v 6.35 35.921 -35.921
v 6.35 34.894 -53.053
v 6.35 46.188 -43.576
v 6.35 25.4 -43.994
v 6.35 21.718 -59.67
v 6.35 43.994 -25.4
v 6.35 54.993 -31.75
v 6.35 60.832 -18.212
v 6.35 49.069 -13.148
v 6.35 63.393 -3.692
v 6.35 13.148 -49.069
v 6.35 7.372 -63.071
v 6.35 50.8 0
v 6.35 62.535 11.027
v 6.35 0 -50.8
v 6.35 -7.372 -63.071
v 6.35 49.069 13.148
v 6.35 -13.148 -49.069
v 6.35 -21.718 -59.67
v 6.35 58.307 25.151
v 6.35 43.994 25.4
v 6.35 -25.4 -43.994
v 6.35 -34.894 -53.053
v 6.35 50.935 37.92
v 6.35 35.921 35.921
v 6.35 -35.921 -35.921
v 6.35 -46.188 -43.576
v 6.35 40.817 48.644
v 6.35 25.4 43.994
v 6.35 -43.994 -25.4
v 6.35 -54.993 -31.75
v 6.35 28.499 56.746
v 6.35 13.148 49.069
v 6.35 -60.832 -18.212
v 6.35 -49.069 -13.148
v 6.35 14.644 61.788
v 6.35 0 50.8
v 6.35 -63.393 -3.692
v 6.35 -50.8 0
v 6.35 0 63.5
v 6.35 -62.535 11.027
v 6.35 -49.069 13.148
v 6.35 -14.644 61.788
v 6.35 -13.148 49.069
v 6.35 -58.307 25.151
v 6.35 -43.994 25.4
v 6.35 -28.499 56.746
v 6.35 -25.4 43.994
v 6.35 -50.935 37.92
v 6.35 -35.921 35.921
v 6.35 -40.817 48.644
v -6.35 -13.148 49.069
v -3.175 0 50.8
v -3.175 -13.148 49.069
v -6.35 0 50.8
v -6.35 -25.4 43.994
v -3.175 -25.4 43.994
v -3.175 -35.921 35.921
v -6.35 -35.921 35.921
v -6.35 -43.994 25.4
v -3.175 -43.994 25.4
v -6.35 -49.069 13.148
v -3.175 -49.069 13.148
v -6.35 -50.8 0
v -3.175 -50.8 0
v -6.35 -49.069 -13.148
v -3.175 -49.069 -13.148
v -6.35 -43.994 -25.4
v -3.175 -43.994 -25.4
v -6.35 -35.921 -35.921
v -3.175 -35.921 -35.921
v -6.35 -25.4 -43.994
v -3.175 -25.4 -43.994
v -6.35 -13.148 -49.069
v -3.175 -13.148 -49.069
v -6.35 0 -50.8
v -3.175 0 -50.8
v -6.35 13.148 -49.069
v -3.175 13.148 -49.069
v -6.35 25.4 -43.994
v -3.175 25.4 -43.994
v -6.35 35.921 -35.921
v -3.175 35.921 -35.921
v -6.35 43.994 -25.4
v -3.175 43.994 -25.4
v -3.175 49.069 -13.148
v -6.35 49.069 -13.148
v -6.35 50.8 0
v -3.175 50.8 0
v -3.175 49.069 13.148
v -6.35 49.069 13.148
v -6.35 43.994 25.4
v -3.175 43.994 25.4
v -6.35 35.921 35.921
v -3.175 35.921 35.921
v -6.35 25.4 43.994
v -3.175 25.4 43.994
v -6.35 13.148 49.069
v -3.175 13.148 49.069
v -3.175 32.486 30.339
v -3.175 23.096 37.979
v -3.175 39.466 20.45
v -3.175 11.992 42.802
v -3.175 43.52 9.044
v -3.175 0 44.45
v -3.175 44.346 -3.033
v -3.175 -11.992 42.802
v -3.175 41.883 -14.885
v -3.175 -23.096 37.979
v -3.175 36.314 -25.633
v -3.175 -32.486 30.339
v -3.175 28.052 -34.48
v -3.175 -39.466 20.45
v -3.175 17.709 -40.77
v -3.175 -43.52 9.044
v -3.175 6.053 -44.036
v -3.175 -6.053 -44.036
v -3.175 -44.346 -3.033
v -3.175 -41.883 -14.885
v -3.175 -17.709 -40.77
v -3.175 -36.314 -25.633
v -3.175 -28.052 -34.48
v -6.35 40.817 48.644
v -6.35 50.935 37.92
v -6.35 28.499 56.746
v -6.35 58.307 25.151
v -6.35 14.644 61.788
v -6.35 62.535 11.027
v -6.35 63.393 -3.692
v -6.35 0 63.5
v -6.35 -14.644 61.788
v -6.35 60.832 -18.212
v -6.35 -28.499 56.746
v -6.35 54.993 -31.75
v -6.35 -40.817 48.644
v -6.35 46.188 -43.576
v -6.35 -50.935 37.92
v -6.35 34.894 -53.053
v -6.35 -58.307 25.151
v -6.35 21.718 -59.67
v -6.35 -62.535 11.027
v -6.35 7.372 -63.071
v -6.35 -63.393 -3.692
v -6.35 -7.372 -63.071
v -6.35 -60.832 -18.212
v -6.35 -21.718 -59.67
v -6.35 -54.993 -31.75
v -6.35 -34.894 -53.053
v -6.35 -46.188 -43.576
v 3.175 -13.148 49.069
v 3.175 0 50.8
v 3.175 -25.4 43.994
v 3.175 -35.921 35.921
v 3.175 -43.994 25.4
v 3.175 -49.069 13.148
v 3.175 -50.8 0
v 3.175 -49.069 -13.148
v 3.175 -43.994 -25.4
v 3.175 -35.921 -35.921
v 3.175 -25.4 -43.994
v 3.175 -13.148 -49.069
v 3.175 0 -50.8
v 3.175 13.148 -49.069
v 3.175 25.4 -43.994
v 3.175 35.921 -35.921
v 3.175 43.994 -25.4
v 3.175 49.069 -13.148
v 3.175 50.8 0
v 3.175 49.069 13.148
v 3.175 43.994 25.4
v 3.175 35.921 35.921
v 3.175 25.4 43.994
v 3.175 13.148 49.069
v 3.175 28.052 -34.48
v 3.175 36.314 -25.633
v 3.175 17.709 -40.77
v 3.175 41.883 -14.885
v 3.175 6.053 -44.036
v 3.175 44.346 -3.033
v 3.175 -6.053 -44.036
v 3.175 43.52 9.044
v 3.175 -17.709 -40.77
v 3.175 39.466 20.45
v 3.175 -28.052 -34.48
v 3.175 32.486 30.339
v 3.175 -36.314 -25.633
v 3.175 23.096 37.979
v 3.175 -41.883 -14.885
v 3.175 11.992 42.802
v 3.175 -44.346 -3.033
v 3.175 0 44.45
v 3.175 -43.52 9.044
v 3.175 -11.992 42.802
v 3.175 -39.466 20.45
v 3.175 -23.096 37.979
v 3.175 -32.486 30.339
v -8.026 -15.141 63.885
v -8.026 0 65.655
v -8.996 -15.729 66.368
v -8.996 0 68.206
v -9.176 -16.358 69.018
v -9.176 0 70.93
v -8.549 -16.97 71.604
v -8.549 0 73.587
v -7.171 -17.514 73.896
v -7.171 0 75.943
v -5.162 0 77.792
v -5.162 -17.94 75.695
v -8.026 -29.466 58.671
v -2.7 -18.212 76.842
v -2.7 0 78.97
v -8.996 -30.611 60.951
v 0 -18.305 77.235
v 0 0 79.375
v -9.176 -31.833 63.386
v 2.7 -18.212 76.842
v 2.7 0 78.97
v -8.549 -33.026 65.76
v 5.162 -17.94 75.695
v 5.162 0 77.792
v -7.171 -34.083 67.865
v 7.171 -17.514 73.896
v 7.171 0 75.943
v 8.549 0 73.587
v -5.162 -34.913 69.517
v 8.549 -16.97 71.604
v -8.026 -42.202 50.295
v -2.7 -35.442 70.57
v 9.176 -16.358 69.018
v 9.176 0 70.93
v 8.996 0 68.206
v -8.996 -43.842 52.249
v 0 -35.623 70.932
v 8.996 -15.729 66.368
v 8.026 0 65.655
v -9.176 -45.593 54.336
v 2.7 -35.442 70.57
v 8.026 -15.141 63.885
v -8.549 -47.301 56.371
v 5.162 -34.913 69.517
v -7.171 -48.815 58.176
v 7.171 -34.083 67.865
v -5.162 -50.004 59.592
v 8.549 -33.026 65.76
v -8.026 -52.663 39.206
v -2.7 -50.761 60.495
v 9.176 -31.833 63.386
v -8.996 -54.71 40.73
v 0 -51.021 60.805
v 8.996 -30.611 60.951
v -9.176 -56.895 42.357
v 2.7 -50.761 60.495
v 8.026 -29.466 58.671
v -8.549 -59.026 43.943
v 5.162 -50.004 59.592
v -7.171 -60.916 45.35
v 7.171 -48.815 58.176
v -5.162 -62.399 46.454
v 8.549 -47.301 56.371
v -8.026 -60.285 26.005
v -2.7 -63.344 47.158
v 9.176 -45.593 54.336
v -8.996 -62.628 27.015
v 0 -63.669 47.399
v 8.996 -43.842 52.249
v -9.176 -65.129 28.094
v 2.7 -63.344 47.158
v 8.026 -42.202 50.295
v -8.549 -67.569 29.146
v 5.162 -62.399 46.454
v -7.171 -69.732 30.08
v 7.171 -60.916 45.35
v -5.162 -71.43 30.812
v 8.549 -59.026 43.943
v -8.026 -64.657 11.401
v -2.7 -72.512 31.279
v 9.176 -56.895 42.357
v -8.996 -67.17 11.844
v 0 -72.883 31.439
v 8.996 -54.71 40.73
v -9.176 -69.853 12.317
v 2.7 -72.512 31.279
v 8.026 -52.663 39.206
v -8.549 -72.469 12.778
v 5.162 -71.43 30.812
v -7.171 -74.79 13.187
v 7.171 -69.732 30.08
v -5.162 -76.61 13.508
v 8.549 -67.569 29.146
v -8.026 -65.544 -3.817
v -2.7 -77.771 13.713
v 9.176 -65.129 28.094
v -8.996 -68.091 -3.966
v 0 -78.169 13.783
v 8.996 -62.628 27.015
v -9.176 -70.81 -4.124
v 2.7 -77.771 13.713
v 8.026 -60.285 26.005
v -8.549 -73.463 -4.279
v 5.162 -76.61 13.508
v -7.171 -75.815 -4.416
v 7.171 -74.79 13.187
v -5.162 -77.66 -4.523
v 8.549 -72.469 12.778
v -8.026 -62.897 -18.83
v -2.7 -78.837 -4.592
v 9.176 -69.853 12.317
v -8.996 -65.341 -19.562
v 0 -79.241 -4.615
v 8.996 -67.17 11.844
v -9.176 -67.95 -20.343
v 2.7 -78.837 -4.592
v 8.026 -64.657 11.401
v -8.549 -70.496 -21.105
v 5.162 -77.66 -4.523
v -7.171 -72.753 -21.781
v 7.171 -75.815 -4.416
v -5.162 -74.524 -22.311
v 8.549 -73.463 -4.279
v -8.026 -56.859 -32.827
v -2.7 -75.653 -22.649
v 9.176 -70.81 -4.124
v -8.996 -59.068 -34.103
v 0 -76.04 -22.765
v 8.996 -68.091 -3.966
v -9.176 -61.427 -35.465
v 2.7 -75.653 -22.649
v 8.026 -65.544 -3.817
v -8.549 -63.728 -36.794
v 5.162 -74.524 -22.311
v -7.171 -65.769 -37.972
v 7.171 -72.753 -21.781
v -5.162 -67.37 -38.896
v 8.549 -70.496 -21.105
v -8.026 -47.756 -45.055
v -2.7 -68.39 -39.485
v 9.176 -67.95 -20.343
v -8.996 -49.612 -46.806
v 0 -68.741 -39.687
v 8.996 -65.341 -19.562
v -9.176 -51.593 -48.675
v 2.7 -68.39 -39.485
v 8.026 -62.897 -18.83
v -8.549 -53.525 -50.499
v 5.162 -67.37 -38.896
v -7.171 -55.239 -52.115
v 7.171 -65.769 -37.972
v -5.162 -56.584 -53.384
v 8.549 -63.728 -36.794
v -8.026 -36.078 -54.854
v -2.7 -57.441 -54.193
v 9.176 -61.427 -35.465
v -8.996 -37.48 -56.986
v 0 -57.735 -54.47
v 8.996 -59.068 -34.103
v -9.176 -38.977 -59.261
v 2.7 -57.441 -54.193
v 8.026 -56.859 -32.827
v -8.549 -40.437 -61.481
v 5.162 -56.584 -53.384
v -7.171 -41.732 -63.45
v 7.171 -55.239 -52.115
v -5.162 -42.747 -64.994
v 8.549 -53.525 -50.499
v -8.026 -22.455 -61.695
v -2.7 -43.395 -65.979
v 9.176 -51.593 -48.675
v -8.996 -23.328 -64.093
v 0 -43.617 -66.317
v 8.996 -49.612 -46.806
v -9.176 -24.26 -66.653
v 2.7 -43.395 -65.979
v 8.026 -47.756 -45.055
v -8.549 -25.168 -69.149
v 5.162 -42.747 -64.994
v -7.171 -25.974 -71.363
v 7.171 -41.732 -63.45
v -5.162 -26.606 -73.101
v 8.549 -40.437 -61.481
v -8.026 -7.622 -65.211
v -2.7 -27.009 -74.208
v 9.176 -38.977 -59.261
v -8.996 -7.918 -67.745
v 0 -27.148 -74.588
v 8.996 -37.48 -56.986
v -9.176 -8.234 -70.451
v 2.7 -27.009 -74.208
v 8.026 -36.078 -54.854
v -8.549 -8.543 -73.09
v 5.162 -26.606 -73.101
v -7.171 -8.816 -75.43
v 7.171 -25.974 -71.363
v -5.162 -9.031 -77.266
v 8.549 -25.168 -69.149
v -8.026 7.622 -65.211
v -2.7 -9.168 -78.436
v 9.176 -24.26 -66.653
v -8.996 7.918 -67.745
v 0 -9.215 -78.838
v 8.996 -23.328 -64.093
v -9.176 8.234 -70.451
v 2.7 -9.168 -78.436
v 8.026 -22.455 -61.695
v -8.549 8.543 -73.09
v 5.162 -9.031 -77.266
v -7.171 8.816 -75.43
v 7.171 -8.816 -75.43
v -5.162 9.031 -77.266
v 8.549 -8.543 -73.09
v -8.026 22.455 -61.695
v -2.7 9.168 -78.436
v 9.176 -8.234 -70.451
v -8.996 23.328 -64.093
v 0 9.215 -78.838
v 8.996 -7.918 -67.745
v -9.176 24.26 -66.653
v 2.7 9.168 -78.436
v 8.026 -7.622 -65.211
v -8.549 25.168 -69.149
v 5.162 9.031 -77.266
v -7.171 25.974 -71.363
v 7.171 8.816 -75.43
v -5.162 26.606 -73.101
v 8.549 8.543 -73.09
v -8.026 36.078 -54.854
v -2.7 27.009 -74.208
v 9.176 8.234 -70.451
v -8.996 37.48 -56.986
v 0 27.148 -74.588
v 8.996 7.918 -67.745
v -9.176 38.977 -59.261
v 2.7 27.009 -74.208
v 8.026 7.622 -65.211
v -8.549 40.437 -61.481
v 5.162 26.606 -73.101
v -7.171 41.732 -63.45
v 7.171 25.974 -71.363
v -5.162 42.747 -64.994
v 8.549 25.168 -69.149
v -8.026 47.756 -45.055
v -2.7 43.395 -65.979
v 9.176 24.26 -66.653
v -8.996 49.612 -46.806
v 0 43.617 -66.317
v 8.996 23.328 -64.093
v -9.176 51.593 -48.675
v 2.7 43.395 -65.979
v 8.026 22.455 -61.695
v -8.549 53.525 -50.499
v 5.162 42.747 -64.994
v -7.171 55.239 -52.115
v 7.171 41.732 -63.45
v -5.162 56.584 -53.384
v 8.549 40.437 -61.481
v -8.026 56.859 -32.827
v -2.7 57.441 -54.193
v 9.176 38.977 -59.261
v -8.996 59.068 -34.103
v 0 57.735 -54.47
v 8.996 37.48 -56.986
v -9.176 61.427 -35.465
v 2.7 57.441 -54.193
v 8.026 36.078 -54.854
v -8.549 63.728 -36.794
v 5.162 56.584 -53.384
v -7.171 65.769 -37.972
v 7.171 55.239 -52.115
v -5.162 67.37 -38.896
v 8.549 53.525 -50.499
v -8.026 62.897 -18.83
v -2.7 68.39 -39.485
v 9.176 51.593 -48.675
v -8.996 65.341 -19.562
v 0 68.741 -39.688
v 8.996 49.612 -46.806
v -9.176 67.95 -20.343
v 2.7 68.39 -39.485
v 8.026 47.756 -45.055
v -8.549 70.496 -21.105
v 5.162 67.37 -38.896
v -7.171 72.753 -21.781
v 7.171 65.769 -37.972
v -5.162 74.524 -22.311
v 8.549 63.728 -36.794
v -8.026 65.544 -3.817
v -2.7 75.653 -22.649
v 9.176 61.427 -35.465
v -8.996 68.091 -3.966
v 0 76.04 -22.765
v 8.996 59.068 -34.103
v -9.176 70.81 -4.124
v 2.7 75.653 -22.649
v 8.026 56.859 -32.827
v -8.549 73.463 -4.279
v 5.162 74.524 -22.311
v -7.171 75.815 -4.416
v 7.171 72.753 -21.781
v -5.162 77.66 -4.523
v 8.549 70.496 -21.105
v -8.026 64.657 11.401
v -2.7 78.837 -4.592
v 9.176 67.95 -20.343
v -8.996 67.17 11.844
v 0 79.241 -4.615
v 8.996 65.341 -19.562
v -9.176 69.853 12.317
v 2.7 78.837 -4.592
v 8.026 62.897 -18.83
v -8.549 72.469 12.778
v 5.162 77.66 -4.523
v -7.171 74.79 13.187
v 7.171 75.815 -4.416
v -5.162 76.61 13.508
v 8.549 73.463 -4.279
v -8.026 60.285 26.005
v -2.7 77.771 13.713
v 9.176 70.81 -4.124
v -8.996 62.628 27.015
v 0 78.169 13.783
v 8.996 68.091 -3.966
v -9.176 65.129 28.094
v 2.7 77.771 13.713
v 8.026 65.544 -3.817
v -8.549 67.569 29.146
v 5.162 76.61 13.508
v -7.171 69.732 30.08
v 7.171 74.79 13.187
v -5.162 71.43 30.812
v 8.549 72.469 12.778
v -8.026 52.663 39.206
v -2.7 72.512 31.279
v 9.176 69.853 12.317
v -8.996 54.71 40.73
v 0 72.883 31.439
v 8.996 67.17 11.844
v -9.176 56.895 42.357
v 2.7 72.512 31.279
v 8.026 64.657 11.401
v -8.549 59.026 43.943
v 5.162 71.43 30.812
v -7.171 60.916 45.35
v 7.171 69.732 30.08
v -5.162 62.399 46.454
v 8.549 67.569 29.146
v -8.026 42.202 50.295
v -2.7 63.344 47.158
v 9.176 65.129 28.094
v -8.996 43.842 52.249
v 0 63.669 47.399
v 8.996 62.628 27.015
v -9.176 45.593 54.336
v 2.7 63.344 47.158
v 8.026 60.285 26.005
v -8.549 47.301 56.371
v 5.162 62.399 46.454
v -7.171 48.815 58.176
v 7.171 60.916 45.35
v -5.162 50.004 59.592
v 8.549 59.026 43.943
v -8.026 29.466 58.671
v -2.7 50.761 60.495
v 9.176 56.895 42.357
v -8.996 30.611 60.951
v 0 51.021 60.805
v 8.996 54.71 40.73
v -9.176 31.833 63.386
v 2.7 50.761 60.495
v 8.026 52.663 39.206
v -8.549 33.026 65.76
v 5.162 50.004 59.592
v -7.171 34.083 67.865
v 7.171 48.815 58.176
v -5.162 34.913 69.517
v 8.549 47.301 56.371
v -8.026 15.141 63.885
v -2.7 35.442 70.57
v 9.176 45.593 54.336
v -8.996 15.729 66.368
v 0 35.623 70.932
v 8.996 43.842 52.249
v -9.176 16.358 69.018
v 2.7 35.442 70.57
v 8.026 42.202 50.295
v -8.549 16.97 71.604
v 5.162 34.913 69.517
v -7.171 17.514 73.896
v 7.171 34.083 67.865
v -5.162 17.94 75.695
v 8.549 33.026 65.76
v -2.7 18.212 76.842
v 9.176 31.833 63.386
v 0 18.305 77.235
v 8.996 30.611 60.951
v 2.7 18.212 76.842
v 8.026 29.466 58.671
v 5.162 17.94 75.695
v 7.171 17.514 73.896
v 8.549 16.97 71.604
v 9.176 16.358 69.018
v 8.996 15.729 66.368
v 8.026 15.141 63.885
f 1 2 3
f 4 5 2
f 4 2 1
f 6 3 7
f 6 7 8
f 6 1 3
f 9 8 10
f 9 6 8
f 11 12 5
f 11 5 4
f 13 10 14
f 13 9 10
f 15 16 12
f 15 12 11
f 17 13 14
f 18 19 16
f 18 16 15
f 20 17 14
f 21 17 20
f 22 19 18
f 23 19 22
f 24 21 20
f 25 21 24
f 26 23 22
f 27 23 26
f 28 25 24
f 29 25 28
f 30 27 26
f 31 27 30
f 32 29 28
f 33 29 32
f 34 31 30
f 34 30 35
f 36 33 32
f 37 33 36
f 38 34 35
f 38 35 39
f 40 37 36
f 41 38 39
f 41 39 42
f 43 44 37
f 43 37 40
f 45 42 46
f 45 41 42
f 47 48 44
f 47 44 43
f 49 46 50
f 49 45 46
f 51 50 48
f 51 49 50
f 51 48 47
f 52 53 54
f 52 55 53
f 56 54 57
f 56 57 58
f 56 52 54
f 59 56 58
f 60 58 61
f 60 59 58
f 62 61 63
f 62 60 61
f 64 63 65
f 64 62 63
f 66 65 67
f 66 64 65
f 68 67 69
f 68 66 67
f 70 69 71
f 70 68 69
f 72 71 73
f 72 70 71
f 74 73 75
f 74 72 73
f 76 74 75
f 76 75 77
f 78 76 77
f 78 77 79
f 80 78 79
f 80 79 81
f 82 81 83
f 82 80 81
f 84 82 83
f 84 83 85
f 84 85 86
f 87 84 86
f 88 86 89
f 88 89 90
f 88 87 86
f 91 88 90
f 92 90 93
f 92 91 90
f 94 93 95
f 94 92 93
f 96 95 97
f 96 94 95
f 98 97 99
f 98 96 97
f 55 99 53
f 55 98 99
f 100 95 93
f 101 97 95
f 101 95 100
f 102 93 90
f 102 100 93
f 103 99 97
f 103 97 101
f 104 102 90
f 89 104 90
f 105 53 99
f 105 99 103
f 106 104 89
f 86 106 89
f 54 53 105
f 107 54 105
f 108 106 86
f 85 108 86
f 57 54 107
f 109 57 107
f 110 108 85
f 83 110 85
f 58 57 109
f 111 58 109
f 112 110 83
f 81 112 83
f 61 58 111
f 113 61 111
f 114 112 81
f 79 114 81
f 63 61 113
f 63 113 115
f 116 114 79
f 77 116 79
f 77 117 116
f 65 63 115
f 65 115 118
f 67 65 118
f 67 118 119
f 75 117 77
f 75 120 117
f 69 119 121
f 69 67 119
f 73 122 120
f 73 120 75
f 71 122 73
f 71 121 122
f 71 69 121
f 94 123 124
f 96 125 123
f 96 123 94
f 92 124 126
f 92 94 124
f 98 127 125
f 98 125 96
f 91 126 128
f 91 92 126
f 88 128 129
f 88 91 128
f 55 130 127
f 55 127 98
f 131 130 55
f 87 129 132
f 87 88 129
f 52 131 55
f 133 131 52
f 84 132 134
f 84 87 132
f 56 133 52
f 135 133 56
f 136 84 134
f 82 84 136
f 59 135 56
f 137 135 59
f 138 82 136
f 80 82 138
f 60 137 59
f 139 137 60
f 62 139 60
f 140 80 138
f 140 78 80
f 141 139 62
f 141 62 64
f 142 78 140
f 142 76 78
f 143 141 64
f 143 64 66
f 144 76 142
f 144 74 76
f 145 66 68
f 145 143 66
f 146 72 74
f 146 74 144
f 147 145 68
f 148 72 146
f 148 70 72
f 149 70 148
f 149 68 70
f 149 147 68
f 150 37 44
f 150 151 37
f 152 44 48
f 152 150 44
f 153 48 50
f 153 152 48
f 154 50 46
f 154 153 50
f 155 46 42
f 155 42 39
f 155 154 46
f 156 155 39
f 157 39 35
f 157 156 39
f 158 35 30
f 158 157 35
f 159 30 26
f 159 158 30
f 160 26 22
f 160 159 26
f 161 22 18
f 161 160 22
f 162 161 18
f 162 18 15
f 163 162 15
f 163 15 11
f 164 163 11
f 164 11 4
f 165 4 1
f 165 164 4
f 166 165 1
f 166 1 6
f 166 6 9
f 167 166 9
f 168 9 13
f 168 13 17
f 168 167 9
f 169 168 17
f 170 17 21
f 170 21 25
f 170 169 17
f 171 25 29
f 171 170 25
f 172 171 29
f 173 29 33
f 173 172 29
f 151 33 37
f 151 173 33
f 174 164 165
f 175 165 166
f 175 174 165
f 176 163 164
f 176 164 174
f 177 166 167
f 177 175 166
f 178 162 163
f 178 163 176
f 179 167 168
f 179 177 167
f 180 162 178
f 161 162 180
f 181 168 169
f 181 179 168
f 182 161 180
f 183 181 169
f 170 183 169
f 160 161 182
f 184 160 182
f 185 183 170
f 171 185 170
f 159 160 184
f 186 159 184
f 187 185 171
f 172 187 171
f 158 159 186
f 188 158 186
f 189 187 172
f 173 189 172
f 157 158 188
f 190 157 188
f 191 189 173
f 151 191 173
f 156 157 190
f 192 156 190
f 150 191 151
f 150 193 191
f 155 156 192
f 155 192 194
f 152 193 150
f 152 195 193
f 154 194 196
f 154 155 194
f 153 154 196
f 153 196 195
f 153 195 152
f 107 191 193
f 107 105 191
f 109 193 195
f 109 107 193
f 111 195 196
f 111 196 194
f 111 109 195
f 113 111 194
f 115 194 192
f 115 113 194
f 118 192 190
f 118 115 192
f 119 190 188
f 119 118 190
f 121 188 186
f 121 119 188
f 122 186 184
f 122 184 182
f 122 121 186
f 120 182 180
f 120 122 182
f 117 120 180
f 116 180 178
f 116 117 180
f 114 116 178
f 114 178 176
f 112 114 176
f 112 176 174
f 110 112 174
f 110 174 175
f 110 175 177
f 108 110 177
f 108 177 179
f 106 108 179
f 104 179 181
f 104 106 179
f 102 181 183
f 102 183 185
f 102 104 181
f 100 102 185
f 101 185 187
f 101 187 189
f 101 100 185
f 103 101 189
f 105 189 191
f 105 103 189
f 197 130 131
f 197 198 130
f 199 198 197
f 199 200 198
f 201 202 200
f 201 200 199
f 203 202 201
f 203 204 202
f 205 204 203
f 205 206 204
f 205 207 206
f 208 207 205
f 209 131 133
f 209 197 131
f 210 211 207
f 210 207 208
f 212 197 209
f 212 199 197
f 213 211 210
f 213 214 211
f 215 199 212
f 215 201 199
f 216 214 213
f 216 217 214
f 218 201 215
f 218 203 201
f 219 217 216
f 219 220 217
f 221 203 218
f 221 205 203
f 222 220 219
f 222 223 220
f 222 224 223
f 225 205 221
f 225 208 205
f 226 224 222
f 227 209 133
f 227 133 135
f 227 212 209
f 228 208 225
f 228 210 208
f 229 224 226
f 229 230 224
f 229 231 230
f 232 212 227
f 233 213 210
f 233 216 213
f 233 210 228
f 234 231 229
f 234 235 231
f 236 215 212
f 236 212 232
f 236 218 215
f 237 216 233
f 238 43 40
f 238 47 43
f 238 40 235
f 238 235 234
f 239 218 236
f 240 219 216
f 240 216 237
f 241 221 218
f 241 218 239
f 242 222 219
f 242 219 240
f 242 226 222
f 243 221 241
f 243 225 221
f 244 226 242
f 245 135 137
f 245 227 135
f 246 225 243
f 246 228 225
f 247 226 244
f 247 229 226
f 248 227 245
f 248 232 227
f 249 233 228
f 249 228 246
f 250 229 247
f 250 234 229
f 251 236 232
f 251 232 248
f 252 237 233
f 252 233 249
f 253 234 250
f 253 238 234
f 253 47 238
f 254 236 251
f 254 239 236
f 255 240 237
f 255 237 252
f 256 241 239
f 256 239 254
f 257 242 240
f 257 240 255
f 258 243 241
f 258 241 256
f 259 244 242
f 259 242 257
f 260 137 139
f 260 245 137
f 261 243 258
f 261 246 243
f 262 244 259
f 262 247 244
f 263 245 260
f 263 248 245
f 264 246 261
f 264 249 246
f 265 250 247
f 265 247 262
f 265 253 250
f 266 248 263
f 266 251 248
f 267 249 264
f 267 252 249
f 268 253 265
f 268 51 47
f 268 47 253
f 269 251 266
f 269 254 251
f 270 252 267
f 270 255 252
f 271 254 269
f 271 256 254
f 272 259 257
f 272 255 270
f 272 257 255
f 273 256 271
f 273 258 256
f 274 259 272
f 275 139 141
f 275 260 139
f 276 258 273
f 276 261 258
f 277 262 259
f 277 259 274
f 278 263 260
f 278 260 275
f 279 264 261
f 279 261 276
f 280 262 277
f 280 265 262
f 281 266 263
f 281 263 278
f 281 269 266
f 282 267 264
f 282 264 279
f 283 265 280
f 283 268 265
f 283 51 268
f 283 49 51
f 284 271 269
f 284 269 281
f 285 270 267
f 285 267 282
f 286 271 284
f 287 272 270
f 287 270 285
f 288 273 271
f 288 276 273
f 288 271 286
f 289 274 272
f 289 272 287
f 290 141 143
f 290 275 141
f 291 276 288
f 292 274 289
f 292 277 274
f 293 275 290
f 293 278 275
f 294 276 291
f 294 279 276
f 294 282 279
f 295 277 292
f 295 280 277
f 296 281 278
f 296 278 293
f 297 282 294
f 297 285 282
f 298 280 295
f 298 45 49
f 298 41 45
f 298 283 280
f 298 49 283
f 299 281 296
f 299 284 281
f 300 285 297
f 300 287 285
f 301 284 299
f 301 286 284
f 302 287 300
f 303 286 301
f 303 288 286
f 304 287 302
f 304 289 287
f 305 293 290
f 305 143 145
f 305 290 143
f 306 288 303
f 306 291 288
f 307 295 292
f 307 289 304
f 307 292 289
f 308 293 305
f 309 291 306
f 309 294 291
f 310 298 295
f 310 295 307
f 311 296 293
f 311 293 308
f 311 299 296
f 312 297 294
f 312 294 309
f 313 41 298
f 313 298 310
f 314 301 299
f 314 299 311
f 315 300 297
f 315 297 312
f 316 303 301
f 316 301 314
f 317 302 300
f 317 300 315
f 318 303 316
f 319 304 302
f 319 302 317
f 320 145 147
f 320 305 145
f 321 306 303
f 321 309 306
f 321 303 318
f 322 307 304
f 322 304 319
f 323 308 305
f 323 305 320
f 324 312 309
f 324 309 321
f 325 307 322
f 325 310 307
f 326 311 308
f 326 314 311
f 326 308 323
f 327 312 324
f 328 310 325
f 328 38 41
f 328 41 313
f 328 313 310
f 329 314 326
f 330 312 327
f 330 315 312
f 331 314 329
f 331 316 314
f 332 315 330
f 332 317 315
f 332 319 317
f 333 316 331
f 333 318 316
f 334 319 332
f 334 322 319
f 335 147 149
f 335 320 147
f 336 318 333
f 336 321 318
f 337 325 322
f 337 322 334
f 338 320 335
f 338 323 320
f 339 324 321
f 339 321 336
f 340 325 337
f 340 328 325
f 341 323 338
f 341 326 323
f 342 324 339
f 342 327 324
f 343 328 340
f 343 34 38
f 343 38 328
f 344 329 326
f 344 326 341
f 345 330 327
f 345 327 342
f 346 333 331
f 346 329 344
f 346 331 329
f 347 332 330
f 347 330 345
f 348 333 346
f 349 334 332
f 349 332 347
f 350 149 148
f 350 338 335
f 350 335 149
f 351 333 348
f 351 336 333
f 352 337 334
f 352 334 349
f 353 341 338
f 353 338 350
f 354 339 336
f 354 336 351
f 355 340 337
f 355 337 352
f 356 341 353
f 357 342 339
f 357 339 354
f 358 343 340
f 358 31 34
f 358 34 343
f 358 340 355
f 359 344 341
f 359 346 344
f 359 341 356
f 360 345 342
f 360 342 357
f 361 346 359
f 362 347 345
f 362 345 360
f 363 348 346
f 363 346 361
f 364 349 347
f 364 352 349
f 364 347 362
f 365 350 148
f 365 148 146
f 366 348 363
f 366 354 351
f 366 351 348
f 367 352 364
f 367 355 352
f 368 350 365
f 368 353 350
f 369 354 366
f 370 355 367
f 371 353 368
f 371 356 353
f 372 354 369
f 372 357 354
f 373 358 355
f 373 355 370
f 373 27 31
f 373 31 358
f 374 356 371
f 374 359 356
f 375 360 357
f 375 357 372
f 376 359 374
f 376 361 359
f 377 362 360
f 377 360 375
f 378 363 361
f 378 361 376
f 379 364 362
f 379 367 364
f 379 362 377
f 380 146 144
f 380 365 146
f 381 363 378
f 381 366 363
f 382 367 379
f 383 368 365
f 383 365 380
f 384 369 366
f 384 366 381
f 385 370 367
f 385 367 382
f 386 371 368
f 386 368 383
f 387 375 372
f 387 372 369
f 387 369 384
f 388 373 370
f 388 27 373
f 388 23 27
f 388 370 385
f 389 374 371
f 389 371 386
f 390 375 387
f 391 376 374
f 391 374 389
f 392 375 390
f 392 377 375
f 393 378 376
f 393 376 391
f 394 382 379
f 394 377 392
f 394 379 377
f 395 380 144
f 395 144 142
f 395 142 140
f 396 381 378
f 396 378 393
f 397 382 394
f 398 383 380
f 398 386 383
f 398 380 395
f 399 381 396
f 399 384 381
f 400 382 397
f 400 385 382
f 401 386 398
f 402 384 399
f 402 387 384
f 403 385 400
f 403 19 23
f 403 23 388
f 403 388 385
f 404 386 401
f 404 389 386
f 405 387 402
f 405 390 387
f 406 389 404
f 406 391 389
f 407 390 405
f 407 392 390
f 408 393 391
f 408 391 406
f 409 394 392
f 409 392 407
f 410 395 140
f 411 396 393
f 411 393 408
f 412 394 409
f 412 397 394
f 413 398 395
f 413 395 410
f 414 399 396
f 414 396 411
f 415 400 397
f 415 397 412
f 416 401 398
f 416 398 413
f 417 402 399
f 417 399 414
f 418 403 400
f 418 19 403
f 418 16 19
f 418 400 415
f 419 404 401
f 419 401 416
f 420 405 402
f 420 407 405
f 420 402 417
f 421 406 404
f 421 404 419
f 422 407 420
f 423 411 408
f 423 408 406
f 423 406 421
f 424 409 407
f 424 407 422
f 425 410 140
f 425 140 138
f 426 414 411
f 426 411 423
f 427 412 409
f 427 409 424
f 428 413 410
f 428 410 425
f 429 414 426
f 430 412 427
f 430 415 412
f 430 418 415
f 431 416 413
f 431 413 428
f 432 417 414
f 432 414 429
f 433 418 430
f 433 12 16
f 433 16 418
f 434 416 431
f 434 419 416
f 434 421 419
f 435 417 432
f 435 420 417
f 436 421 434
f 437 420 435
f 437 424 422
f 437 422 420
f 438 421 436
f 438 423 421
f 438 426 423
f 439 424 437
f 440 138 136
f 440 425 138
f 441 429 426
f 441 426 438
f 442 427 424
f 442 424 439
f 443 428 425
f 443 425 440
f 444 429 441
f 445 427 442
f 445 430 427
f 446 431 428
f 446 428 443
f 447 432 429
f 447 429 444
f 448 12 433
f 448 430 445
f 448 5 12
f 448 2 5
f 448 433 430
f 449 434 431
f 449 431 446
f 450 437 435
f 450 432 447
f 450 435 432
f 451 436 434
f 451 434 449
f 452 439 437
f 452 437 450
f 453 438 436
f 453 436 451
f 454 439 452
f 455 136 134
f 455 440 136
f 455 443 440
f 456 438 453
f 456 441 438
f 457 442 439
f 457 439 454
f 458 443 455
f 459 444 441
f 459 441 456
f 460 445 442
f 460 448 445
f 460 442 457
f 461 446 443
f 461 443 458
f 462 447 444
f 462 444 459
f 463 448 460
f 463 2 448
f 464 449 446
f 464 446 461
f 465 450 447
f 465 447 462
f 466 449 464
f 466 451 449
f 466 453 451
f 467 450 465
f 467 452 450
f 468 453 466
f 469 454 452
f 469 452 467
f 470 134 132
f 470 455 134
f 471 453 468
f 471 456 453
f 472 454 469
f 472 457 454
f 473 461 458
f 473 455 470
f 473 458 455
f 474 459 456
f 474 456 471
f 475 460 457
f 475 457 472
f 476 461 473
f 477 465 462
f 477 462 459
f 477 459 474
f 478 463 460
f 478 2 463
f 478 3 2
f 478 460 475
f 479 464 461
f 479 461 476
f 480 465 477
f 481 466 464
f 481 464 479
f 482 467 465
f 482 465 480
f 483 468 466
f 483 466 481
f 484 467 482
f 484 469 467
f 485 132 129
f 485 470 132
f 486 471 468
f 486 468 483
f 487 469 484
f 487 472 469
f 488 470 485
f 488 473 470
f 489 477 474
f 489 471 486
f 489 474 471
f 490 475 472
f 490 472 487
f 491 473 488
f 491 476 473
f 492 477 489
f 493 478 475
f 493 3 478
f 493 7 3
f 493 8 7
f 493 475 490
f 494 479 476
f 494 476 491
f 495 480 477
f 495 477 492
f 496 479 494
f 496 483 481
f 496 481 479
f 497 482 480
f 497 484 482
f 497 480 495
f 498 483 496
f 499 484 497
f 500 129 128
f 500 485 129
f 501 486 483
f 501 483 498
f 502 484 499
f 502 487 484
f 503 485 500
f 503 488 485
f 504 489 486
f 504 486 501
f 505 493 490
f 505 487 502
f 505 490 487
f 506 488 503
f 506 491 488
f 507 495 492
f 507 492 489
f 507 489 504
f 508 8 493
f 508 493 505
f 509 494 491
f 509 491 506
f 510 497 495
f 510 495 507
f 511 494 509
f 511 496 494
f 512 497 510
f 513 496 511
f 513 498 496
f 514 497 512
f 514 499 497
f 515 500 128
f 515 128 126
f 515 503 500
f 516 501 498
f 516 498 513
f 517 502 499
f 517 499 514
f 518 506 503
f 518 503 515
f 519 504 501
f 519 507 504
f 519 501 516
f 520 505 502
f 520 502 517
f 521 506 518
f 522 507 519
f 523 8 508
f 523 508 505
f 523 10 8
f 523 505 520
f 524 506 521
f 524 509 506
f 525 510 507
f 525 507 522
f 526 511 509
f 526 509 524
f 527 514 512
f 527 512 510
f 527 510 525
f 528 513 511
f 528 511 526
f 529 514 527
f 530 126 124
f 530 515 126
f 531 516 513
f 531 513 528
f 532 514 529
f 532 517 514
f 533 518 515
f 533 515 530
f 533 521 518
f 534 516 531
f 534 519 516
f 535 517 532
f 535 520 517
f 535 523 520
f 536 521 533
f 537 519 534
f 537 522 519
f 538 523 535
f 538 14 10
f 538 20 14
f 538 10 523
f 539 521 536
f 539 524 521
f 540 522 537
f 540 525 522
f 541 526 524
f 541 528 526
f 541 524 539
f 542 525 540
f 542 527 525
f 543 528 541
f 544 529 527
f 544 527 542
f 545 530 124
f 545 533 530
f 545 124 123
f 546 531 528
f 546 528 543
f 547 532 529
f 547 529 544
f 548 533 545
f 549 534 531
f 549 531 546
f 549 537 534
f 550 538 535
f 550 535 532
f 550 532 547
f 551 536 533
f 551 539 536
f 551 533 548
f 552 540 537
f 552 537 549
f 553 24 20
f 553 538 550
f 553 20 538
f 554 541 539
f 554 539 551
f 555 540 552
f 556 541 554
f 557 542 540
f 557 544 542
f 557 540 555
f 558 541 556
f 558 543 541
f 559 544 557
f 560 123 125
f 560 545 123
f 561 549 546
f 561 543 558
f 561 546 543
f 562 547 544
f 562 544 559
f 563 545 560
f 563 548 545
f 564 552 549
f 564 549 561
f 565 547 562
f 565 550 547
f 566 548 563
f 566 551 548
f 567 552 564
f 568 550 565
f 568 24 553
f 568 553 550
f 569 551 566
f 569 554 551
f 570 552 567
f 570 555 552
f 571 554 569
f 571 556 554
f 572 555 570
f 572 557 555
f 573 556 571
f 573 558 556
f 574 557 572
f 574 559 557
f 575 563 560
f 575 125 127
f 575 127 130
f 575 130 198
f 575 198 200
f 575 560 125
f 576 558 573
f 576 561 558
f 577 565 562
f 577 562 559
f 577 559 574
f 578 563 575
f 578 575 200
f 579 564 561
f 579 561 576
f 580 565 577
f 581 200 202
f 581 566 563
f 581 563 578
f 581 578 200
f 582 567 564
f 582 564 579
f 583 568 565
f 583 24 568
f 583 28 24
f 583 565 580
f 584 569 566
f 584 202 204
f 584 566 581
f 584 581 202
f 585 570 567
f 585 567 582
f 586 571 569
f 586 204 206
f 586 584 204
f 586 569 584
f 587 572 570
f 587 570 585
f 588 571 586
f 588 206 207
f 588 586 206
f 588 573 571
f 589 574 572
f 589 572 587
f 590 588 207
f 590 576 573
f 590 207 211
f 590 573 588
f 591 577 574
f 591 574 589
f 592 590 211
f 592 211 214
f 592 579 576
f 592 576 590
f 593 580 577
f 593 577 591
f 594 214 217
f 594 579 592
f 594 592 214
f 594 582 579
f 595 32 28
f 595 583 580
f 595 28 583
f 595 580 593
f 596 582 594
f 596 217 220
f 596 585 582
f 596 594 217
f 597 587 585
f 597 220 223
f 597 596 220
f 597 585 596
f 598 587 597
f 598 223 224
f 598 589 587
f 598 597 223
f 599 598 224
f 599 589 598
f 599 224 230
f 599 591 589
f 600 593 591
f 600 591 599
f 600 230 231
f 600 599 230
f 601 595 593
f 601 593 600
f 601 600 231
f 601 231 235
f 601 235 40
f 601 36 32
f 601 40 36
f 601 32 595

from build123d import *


with BuildPart() as part:
    # Sketch1 → Revolve1 (revolve)
    with BuildSketch(Plane.XY, mode=Mode.PRIVATE) as revolve1_sk:
        with BuildLine():
            ThreePointArc((-6.35, 63.5), (0, 79.375), (6.35, 63.5))
            Line((6.35, 63.5), (6.35, 50.8))
            Line((6.35, 50.8), (3.175, 50.8))
            Line((3.175, 50.8), (3.175, 44.45))
            Line((3.175, 44.45), (-3.175, 44.45))
            Line((-3.175, 44.45), (-3.175, 50.8))
            Line((-3.175, 50.8), (-6.35, 50.8))
            Line((-6.35, 50.8), (-6.35, 63.5))
        make_face()
    revolve(revolve1_sk.sketch.rotate(Axis((0, 0, 0), (1, 0, 0)), 90), axis=Axis((0, 0, 0), (1, 0, 0)))


solid = part.part
